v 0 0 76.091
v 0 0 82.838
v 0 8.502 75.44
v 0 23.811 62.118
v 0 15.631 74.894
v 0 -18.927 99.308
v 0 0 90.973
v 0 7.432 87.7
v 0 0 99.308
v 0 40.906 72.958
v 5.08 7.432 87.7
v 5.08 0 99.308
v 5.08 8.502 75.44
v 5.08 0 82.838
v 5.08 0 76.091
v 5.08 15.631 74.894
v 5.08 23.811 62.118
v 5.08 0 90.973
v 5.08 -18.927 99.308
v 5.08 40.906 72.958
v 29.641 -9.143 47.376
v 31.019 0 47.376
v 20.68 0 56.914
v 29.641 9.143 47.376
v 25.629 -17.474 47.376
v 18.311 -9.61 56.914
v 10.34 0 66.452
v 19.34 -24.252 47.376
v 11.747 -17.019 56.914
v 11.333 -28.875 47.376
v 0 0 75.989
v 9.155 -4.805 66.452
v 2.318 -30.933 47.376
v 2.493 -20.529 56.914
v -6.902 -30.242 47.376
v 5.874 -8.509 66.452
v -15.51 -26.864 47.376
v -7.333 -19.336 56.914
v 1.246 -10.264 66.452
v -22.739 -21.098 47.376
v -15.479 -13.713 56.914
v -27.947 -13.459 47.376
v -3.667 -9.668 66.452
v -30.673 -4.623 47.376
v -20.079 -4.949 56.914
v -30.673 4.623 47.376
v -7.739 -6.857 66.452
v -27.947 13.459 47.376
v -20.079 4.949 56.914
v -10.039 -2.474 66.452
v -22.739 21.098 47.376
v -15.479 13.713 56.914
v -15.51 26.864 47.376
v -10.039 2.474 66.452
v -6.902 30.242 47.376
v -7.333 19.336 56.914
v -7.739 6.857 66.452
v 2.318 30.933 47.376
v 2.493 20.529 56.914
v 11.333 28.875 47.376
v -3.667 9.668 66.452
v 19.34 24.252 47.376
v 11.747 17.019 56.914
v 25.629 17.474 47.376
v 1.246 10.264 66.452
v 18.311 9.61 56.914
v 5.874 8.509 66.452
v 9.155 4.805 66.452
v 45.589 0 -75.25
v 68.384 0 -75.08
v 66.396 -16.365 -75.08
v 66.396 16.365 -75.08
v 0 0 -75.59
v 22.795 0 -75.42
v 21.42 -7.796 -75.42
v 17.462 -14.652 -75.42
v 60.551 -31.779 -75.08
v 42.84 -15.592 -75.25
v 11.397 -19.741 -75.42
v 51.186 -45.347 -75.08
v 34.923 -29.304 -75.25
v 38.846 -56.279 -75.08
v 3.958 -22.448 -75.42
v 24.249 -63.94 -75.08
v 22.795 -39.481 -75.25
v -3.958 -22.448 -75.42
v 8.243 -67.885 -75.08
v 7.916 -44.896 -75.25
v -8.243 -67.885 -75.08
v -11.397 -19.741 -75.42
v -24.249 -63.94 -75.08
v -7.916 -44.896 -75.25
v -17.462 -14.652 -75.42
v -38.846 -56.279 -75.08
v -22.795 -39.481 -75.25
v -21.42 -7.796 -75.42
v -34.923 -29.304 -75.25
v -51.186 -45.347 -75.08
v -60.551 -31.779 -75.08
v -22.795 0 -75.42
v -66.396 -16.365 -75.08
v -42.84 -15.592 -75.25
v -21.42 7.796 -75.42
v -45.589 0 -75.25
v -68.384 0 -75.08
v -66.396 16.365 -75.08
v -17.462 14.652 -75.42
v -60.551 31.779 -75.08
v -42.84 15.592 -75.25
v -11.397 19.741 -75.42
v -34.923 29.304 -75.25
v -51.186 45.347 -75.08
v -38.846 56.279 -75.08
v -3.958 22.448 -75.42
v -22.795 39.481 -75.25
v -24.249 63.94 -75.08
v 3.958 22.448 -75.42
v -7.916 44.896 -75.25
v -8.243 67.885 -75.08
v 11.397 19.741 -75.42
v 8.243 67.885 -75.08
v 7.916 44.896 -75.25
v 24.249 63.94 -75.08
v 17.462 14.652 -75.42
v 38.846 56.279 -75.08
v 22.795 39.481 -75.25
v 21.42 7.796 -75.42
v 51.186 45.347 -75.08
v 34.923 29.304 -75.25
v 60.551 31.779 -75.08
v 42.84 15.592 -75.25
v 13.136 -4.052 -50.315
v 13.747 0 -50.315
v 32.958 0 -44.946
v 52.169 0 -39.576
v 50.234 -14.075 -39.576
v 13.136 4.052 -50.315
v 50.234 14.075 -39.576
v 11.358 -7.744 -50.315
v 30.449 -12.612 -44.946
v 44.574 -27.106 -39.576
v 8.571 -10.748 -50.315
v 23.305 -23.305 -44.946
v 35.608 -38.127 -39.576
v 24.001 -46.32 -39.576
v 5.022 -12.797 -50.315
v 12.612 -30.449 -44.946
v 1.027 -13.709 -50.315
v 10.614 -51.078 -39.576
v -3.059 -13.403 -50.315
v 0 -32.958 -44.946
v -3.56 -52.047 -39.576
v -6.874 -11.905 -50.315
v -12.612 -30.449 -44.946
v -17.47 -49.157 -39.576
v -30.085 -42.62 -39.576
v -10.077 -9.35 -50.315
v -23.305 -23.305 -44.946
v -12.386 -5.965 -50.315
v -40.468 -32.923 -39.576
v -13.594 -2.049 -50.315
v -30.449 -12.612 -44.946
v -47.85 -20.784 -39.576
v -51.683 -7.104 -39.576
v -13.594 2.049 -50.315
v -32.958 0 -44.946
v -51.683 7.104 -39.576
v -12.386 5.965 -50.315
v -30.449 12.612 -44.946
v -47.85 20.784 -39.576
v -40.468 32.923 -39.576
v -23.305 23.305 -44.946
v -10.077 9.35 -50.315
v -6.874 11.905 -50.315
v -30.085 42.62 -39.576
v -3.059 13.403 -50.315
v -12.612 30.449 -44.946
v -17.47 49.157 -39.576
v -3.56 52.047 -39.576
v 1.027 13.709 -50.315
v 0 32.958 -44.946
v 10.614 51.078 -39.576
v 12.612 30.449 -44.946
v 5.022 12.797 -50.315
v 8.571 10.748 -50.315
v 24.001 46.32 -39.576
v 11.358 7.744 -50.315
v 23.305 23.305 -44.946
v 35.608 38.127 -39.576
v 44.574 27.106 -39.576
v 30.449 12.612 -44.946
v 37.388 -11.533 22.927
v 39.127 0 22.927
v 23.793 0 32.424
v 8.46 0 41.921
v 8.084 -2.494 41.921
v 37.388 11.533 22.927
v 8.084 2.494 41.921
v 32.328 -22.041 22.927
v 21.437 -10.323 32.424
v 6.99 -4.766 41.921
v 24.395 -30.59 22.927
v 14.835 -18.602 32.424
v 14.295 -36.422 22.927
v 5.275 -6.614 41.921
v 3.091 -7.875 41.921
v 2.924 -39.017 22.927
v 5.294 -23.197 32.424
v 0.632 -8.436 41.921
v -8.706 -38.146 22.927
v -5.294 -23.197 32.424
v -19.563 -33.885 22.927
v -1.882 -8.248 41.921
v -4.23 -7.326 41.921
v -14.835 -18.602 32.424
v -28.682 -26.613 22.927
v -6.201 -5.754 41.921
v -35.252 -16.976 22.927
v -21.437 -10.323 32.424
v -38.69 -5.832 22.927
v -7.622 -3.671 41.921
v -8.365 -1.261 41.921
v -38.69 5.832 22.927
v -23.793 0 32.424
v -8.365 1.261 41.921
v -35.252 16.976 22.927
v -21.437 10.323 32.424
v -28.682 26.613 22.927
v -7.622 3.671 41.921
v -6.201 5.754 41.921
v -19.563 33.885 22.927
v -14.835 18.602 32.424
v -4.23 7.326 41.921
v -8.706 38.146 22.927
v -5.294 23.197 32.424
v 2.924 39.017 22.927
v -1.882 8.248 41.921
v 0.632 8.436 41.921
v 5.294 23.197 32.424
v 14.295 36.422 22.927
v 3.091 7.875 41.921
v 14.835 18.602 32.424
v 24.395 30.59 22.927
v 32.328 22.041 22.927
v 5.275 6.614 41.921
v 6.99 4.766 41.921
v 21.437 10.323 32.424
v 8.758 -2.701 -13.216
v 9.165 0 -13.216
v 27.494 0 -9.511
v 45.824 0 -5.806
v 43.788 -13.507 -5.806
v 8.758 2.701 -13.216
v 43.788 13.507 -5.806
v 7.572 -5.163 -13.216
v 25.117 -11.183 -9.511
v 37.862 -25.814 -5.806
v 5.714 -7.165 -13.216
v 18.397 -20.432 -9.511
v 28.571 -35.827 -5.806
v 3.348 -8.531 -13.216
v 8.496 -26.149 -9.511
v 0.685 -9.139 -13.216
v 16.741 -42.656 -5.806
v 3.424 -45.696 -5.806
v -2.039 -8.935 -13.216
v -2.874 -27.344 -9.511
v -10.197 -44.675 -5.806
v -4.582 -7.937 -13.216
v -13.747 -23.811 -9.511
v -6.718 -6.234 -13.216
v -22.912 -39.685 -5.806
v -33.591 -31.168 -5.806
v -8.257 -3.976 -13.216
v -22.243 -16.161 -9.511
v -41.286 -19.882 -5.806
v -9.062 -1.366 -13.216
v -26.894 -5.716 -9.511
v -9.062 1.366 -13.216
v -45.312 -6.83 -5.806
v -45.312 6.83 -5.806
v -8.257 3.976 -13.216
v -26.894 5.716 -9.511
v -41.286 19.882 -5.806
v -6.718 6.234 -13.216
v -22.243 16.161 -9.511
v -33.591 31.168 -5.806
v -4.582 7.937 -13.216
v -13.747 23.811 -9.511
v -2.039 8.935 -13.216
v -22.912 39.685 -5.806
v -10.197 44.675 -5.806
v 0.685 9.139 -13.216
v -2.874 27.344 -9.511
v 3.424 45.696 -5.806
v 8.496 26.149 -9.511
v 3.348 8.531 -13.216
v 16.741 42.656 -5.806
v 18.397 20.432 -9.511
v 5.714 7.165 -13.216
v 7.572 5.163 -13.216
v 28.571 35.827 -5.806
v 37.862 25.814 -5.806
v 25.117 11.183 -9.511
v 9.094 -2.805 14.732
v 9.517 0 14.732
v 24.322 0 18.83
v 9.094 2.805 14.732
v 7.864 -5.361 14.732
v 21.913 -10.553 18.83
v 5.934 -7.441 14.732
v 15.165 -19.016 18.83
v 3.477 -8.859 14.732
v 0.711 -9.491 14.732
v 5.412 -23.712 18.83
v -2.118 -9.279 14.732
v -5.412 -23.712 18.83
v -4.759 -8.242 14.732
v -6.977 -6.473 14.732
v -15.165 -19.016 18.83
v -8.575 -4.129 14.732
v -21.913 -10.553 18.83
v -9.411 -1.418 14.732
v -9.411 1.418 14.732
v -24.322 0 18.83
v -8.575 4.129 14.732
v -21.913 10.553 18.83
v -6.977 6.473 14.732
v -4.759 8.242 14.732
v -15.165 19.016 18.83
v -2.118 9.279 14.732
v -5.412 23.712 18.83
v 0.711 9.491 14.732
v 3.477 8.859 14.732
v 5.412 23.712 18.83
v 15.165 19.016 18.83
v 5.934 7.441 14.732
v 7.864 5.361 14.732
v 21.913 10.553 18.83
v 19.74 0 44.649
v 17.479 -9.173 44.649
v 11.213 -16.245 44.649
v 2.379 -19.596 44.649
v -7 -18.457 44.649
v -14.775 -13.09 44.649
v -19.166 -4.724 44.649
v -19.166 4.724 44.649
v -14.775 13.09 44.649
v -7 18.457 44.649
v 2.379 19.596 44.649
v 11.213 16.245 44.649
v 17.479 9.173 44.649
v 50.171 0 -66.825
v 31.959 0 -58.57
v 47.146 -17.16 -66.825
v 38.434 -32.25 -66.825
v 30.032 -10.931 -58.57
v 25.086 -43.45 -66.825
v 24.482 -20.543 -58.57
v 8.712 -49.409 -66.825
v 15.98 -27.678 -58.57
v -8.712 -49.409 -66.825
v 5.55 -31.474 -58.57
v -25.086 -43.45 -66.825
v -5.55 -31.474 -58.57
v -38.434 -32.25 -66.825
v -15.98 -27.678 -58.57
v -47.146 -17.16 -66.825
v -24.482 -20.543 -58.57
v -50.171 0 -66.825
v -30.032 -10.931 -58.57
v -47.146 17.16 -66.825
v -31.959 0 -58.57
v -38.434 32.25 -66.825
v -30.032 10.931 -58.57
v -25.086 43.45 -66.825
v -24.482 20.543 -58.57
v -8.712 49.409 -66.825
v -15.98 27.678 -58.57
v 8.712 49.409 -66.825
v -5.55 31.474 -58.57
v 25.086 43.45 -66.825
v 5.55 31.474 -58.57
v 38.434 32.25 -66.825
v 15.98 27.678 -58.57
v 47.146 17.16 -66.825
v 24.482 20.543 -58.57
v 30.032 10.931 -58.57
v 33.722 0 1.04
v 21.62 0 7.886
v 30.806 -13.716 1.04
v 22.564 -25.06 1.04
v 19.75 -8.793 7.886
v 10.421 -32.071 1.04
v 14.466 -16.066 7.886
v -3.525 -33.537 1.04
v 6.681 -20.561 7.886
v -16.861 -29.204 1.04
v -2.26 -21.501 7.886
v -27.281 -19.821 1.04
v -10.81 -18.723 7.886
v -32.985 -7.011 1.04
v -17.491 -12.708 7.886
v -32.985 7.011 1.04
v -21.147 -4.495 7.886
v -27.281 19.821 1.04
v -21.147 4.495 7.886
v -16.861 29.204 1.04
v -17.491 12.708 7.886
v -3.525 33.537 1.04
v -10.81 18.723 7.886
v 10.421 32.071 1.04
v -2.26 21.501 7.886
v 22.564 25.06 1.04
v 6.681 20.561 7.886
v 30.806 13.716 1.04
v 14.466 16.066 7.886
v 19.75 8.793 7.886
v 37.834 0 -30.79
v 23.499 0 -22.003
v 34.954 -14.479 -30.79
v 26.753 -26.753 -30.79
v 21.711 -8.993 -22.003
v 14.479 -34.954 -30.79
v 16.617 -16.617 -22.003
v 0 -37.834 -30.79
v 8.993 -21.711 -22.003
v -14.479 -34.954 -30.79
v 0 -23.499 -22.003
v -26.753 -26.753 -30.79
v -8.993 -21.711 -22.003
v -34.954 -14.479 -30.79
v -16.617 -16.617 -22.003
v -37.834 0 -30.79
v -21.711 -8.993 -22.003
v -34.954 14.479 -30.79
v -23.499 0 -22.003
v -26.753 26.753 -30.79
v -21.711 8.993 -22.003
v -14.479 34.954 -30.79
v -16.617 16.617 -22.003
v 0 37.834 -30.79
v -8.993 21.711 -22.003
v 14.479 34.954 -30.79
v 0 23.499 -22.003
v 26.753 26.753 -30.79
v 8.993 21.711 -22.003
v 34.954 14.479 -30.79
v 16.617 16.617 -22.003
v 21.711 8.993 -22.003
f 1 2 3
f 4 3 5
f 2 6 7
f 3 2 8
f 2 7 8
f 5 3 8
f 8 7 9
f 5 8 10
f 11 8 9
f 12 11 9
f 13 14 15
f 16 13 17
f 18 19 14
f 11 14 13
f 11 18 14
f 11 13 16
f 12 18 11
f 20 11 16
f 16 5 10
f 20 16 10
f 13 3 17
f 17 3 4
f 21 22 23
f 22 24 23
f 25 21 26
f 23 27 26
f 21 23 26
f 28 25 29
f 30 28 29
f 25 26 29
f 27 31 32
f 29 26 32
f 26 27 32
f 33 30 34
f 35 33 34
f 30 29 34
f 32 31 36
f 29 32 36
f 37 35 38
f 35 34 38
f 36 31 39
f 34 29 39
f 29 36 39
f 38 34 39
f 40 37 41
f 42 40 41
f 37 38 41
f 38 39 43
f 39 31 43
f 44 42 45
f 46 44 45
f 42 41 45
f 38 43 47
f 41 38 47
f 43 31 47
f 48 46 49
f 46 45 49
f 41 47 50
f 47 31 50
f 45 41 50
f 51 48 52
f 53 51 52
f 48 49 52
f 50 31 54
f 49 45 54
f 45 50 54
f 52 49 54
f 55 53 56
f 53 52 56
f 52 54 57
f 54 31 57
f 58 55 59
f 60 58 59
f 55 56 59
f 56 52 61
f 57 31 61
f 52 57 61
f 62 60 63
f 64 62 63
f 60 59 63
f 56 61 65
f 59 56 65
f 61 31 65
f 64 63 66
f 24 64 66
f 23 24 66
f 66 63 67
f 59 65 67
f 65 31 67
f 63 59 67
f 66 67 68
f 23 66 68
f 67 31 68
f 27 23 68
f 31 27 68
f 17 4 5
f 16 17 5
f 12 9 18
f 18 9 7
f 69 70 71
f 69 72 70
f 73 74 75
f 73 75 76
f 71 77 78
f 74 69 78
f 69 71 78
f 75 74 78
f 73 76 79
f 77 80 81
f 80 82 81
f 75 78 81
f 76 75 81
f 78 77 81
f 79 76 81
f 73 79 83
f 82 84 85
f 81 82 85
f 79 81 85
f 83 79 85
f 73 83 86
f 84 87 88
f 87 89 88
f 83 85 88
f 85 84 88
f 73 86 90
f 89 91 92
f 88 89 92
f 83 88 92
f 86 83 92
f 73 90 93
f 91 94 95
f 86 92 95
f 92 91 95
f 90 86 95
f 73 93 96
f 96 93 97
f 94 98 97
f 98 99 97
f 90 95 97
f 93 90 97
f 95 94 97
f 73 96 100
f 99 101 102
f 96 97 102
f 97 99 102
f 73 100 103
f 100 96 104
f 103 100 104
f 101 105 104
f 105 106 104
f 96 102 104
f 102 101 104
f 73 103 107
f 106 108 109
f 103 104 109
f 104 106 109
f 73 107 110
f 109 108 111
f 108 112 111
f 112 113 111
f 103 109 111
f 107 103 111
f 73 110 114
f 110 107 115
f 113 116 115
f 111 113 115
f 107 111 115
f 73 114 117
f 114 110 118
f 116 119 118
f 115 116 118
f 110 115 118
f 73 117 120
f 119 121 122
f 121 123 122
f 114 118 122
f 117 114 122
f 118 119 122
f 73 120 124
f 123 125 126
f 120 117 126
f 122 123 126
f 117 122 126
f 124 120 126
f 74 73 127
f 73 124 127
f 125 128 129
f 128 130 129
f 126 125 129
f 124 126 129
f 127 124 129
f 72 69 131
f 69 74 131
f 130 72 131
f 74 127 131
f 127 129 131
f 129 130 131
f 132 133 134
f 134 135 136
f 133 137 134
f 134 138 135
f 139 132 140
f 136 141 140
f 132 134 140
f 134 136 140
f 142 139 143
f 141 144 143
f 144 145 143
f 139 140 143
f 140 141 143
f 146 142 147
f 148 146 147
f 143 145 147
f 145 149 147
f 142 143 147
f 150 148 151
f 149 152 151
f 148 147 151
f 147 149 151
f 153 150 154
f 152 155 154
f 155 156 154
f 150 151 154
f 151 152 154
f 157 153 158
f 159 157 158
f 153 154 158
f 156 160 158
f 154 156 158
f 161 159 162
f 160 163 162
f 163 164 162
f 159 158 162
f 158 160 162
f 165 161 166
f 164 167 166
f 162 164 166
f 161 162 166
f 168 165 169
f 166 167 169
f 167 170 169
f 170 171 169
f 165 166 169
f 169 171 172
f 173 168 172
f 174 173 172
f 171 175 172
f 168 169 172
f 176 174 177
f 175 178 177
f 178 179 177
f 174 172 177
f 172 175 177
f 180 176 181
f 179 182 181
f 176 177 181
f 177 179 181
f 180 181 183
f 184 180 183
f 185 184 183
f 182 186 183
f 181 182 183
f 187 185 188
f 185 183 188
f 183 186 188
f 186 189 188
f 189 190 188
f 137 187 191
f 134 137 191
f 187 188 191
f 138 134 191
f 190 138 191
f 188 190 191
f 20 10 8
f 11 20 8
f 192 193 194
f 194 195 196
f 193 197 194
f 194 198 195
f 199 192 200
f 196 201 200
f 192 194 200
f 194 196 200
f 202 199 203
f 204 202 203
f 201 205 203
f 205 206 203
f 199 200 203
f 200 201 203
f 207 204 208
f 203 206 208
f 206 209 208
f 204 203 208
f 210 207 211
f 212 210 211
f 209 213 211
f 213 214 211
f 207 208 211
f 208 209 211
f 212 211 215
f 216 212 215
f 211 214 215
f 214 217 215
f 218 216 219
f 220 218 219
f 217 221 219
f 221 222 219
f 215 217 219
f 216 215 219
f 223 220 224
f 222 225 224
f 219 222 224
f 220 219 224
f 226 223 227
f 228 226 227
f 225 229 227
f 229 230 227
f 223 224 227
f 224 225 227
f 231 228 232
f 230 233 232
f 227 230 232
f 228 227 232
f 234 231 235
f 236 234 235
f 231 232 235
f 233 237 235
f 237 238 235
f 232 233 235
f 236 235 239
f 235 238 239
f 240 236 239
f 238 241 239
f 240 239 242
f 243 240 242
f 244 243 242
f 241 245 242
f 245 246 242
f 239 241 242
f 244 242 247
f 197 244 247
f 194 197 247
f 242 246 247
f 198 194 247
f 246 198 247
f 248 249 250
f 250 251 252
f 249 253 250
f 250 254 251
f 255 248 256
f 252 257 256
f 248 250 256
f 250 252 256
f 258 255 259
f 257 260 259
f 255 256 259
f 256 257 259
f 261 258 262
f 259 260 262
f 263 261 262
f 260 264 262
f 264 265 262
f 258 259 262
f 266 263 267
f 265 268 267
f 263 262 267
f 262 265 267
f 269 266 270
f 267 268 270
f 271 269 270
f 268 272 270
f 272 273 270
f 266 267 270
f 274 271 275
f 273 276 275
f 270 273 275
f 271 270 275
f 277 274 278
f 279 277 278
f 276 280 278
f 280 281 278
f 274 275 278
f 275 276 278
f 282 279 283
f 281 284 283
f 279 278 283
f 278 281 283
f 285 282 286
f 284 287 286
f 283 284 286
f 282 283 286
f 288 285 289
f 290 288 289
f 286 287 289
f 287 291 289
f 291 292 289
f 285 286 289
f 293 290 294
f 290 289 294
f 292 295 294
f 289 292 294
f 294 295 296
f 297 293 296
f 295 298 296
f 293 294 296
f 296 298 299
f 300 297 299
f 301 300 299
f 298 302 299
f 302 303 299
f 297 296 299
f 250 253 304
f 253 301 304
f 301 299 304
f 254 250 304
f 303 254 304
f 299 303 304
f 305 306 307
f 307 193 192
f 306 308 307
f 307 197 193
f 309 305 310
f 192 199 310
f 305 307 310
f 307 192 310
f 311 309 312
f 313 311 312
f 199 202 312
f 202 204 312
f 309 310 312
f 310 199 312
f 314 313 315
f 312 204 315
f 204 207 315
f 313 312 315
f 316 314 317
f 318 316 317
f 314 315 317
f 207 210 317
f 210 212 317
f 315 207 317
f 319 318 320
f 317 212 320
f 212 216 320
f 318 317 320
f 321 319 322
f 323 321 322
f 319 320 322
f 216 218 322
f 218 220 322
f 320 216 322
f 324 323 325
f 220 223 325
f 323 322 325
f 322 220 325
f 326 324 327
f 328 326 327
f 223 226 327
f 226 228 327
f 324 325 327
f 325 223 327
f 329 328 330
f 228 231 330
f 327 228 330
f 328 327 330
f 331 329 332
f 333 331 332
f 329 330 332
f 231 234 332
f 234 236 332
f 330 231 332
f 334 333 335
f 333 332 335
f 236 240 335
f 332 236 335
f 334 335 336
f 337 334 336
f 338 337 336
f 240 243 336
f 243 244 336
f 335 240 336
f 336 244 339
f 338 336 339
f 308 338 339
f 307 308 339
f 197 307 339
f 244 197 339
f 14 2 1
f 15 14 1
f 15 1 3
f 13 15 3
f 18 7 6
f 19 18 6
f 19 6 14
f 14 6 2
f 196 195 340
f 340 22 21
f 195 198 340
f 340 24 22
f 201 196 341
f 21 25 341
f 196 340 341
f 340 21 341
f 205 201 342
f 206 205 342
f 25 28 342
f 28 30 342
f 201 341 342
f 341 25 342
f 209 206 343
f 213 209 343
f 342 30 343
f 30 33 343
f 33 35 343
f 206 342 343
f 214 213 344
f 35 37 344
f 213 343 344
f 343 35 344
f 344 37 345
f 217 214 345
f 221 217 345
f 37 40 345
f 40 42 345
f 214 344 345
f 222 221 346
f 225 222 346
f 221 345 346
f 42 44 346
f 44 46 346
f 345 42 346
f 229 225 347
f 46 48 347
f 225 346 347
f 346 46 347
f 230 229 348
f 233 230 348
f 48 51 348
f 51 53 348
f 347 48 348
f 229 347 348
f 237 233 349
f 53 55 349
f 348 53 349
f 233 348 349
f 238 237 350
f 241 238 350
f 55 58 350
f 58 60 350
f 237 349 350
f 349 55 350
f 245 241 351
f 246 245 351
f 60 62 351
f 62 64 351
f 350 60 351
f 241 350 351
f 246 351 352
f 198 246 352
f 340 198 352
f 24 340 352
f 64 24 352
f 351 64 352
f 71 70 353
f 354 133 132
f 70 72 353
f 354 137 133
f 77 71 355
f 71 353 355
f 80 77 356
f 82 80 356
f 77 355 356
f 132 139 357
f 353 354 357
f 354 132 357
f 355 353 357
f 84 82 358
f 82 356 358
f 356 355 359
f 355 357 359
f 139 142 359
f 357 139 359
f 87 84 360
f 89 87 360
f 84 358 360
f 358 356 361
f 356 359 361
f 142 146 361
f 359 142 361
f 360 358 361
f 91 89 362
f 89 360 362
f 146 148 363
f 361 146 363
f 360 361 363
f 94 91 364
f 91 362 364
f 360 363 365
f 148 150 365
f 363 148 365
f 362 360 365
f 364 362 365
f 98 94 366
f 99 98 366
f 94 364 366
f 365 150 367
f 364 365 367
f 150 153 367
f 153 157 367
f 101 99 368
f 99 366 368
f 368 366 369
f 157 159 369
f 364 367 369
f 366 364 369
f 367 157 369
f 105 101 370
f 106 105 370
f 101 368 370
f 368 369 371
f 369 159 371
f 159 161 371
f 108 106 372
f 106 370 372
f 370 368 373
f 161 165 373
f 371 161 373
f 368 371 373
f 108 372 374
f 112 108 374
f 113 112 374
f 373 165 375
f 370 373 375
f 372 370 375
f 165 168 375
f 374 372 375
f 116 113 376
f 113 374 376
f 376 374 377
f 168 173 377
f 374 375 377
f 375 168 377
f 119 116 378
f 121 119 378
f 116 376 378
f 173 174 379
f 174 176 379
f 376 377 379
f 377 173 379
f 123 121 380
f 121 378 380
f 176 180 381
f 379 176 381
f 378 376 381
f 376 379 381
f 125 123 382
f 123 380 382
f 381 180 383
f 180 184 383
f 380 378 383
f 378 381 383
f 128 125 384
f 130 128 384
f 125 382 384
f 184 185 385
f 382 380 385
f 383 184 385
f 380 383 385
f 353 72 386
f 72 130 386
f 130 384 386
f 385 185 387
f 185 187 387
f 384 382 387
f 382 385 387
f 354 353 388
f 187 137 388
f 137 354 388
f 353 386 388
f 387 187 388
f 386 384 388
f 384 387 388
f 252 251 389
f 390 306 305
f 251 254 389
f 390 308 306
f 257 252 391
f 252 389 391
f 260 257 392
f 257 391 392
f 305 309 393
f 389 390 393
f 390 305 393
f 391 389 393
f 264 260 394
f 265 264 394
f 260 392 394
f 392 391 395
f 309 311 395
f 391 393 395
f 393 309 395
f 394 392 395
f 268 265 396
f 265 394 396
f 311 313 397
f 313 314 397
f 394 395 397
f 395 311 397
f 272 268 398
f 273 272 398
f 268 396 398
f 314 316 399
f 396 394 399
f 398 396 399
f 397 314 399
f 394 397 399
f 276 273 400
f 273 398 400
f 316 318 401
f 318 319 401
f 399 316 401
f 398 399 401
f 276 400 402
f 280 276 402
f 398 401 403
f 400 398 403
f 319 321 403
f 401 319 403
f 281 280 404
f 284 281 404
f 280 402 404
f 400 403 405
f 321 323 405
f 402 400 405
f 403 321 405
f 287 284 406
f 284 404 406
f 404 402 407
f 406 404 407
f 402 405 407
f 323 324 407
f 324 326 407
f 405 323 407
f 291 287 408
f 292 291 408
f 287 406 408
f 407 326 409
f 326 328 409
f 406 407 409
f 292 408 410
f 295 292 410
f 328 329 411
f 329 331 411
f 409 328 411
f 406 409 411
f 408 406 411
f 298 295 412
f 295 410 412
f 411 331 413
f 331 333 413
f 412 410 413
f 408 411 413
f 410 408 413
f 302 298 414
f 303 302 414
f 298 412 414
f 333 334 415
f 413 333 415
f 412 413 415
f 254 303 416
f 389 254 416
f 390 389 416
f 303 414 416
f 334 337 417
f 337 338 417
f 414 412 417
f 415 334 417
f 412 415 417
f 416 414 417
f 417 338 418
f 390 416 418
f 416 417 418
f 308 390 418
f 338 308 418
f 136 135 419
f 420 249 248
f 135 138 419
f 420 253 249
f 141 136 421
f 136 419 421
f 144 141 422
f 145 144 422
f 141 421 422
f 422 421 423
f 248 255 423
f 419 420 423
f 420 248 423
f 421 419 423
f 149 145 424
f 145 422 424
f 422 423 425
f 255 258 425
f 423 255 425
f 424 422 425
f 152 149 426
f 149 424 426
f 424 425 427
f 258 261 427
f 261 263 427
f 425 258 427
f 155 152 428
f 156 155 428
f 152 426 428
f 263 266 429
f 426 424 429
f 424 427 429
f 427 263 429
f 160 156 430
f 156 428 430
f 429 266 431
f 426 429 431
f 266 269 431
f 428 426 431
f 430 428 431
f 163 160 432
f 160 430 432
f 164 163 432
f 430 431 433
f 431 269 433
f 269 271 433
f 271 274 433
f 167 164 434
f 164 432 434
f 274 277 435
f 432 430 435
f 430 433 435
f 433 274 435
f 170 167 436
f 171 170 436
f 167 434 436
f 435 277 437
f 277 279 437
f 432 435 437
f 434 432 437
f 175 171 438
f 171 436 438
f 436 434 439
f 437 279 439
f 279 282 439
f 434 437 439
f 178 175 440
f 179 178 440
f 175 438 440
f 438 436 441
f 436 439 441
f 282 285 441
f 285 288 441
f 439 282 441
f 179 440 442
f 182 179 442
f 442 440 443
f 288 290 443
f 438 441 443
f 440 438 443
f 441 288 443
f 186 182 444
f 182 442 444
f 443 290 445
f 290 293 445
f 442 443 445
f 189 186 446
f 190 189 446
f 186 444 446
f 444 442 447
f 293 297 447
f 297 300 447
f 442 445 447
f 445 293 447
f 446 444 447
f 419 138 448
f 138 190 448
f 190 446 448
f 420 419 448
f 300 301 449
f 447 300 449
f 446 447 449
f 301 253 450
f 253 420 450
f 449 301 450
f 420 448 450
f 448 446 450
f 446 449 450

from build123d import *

# Parameters (mm, degrees)
F3_DEPTH = 5.08


with BuildPart() as f1:
    # F0 (on Front) → F1 (revolve)
    with BuildSketch(Plane.XZ):
        Polygon((31.0193225741, 47.3761707544), (0, 75.9893655777), (0, -75.5896419287), (68.3835148811, -75.0798285007), (13.7472031638, -50.3153465688), (52.1688722074, -39.5764559507), (9.1648055241, -13.2164992392), (45.8240024745, -5.806340836), (9.5172934234, 14.7321484983), (39.1266532242, 22.9271389544), (8.4598176181, 41.9212840497), align=None)
    revolve(axis=Axis((0, 0, 0.1998618245), (0, 0, -1)))


with BuildPart() as f3:
    # F2 (on Right) → F3 (new body)
    with BuildSketch(Plane.YZ):
        Polygon((0, 82.8383528268), (0, 76.0911256075), (8.5020121268, 75.439835778), align=None)
        Polygon((-18.926570192, 99.3084013462), (0, 82.8383528268), (0, 90.9729348781), align=None)
        Polygon((0, 90.9729348781), (0, 82.8383528268), (8.5020121268, 75.439835778), (15.6312974104, 74.8937025889), (7.4324240626, 87.6996148353), align=None)
        Polygon((15.6312974104, 74.8937025889), (8.5020121268, 75.439835778), (23.810852319, 62.1179640293), align=None)
        Polygon((0, 99.3084013462), (0, 90.9729348781), (7.4324240626, 87.6996148353), align=None)
        Polygon((7.4324240626, 87.6996148353), (15.6312974104, 74.8937025889), (40.9058220685, 72.9575678706), align=None)
    extrude(amount=F3_DEPTH)


solid = Compound([f1.part, f3.part])
